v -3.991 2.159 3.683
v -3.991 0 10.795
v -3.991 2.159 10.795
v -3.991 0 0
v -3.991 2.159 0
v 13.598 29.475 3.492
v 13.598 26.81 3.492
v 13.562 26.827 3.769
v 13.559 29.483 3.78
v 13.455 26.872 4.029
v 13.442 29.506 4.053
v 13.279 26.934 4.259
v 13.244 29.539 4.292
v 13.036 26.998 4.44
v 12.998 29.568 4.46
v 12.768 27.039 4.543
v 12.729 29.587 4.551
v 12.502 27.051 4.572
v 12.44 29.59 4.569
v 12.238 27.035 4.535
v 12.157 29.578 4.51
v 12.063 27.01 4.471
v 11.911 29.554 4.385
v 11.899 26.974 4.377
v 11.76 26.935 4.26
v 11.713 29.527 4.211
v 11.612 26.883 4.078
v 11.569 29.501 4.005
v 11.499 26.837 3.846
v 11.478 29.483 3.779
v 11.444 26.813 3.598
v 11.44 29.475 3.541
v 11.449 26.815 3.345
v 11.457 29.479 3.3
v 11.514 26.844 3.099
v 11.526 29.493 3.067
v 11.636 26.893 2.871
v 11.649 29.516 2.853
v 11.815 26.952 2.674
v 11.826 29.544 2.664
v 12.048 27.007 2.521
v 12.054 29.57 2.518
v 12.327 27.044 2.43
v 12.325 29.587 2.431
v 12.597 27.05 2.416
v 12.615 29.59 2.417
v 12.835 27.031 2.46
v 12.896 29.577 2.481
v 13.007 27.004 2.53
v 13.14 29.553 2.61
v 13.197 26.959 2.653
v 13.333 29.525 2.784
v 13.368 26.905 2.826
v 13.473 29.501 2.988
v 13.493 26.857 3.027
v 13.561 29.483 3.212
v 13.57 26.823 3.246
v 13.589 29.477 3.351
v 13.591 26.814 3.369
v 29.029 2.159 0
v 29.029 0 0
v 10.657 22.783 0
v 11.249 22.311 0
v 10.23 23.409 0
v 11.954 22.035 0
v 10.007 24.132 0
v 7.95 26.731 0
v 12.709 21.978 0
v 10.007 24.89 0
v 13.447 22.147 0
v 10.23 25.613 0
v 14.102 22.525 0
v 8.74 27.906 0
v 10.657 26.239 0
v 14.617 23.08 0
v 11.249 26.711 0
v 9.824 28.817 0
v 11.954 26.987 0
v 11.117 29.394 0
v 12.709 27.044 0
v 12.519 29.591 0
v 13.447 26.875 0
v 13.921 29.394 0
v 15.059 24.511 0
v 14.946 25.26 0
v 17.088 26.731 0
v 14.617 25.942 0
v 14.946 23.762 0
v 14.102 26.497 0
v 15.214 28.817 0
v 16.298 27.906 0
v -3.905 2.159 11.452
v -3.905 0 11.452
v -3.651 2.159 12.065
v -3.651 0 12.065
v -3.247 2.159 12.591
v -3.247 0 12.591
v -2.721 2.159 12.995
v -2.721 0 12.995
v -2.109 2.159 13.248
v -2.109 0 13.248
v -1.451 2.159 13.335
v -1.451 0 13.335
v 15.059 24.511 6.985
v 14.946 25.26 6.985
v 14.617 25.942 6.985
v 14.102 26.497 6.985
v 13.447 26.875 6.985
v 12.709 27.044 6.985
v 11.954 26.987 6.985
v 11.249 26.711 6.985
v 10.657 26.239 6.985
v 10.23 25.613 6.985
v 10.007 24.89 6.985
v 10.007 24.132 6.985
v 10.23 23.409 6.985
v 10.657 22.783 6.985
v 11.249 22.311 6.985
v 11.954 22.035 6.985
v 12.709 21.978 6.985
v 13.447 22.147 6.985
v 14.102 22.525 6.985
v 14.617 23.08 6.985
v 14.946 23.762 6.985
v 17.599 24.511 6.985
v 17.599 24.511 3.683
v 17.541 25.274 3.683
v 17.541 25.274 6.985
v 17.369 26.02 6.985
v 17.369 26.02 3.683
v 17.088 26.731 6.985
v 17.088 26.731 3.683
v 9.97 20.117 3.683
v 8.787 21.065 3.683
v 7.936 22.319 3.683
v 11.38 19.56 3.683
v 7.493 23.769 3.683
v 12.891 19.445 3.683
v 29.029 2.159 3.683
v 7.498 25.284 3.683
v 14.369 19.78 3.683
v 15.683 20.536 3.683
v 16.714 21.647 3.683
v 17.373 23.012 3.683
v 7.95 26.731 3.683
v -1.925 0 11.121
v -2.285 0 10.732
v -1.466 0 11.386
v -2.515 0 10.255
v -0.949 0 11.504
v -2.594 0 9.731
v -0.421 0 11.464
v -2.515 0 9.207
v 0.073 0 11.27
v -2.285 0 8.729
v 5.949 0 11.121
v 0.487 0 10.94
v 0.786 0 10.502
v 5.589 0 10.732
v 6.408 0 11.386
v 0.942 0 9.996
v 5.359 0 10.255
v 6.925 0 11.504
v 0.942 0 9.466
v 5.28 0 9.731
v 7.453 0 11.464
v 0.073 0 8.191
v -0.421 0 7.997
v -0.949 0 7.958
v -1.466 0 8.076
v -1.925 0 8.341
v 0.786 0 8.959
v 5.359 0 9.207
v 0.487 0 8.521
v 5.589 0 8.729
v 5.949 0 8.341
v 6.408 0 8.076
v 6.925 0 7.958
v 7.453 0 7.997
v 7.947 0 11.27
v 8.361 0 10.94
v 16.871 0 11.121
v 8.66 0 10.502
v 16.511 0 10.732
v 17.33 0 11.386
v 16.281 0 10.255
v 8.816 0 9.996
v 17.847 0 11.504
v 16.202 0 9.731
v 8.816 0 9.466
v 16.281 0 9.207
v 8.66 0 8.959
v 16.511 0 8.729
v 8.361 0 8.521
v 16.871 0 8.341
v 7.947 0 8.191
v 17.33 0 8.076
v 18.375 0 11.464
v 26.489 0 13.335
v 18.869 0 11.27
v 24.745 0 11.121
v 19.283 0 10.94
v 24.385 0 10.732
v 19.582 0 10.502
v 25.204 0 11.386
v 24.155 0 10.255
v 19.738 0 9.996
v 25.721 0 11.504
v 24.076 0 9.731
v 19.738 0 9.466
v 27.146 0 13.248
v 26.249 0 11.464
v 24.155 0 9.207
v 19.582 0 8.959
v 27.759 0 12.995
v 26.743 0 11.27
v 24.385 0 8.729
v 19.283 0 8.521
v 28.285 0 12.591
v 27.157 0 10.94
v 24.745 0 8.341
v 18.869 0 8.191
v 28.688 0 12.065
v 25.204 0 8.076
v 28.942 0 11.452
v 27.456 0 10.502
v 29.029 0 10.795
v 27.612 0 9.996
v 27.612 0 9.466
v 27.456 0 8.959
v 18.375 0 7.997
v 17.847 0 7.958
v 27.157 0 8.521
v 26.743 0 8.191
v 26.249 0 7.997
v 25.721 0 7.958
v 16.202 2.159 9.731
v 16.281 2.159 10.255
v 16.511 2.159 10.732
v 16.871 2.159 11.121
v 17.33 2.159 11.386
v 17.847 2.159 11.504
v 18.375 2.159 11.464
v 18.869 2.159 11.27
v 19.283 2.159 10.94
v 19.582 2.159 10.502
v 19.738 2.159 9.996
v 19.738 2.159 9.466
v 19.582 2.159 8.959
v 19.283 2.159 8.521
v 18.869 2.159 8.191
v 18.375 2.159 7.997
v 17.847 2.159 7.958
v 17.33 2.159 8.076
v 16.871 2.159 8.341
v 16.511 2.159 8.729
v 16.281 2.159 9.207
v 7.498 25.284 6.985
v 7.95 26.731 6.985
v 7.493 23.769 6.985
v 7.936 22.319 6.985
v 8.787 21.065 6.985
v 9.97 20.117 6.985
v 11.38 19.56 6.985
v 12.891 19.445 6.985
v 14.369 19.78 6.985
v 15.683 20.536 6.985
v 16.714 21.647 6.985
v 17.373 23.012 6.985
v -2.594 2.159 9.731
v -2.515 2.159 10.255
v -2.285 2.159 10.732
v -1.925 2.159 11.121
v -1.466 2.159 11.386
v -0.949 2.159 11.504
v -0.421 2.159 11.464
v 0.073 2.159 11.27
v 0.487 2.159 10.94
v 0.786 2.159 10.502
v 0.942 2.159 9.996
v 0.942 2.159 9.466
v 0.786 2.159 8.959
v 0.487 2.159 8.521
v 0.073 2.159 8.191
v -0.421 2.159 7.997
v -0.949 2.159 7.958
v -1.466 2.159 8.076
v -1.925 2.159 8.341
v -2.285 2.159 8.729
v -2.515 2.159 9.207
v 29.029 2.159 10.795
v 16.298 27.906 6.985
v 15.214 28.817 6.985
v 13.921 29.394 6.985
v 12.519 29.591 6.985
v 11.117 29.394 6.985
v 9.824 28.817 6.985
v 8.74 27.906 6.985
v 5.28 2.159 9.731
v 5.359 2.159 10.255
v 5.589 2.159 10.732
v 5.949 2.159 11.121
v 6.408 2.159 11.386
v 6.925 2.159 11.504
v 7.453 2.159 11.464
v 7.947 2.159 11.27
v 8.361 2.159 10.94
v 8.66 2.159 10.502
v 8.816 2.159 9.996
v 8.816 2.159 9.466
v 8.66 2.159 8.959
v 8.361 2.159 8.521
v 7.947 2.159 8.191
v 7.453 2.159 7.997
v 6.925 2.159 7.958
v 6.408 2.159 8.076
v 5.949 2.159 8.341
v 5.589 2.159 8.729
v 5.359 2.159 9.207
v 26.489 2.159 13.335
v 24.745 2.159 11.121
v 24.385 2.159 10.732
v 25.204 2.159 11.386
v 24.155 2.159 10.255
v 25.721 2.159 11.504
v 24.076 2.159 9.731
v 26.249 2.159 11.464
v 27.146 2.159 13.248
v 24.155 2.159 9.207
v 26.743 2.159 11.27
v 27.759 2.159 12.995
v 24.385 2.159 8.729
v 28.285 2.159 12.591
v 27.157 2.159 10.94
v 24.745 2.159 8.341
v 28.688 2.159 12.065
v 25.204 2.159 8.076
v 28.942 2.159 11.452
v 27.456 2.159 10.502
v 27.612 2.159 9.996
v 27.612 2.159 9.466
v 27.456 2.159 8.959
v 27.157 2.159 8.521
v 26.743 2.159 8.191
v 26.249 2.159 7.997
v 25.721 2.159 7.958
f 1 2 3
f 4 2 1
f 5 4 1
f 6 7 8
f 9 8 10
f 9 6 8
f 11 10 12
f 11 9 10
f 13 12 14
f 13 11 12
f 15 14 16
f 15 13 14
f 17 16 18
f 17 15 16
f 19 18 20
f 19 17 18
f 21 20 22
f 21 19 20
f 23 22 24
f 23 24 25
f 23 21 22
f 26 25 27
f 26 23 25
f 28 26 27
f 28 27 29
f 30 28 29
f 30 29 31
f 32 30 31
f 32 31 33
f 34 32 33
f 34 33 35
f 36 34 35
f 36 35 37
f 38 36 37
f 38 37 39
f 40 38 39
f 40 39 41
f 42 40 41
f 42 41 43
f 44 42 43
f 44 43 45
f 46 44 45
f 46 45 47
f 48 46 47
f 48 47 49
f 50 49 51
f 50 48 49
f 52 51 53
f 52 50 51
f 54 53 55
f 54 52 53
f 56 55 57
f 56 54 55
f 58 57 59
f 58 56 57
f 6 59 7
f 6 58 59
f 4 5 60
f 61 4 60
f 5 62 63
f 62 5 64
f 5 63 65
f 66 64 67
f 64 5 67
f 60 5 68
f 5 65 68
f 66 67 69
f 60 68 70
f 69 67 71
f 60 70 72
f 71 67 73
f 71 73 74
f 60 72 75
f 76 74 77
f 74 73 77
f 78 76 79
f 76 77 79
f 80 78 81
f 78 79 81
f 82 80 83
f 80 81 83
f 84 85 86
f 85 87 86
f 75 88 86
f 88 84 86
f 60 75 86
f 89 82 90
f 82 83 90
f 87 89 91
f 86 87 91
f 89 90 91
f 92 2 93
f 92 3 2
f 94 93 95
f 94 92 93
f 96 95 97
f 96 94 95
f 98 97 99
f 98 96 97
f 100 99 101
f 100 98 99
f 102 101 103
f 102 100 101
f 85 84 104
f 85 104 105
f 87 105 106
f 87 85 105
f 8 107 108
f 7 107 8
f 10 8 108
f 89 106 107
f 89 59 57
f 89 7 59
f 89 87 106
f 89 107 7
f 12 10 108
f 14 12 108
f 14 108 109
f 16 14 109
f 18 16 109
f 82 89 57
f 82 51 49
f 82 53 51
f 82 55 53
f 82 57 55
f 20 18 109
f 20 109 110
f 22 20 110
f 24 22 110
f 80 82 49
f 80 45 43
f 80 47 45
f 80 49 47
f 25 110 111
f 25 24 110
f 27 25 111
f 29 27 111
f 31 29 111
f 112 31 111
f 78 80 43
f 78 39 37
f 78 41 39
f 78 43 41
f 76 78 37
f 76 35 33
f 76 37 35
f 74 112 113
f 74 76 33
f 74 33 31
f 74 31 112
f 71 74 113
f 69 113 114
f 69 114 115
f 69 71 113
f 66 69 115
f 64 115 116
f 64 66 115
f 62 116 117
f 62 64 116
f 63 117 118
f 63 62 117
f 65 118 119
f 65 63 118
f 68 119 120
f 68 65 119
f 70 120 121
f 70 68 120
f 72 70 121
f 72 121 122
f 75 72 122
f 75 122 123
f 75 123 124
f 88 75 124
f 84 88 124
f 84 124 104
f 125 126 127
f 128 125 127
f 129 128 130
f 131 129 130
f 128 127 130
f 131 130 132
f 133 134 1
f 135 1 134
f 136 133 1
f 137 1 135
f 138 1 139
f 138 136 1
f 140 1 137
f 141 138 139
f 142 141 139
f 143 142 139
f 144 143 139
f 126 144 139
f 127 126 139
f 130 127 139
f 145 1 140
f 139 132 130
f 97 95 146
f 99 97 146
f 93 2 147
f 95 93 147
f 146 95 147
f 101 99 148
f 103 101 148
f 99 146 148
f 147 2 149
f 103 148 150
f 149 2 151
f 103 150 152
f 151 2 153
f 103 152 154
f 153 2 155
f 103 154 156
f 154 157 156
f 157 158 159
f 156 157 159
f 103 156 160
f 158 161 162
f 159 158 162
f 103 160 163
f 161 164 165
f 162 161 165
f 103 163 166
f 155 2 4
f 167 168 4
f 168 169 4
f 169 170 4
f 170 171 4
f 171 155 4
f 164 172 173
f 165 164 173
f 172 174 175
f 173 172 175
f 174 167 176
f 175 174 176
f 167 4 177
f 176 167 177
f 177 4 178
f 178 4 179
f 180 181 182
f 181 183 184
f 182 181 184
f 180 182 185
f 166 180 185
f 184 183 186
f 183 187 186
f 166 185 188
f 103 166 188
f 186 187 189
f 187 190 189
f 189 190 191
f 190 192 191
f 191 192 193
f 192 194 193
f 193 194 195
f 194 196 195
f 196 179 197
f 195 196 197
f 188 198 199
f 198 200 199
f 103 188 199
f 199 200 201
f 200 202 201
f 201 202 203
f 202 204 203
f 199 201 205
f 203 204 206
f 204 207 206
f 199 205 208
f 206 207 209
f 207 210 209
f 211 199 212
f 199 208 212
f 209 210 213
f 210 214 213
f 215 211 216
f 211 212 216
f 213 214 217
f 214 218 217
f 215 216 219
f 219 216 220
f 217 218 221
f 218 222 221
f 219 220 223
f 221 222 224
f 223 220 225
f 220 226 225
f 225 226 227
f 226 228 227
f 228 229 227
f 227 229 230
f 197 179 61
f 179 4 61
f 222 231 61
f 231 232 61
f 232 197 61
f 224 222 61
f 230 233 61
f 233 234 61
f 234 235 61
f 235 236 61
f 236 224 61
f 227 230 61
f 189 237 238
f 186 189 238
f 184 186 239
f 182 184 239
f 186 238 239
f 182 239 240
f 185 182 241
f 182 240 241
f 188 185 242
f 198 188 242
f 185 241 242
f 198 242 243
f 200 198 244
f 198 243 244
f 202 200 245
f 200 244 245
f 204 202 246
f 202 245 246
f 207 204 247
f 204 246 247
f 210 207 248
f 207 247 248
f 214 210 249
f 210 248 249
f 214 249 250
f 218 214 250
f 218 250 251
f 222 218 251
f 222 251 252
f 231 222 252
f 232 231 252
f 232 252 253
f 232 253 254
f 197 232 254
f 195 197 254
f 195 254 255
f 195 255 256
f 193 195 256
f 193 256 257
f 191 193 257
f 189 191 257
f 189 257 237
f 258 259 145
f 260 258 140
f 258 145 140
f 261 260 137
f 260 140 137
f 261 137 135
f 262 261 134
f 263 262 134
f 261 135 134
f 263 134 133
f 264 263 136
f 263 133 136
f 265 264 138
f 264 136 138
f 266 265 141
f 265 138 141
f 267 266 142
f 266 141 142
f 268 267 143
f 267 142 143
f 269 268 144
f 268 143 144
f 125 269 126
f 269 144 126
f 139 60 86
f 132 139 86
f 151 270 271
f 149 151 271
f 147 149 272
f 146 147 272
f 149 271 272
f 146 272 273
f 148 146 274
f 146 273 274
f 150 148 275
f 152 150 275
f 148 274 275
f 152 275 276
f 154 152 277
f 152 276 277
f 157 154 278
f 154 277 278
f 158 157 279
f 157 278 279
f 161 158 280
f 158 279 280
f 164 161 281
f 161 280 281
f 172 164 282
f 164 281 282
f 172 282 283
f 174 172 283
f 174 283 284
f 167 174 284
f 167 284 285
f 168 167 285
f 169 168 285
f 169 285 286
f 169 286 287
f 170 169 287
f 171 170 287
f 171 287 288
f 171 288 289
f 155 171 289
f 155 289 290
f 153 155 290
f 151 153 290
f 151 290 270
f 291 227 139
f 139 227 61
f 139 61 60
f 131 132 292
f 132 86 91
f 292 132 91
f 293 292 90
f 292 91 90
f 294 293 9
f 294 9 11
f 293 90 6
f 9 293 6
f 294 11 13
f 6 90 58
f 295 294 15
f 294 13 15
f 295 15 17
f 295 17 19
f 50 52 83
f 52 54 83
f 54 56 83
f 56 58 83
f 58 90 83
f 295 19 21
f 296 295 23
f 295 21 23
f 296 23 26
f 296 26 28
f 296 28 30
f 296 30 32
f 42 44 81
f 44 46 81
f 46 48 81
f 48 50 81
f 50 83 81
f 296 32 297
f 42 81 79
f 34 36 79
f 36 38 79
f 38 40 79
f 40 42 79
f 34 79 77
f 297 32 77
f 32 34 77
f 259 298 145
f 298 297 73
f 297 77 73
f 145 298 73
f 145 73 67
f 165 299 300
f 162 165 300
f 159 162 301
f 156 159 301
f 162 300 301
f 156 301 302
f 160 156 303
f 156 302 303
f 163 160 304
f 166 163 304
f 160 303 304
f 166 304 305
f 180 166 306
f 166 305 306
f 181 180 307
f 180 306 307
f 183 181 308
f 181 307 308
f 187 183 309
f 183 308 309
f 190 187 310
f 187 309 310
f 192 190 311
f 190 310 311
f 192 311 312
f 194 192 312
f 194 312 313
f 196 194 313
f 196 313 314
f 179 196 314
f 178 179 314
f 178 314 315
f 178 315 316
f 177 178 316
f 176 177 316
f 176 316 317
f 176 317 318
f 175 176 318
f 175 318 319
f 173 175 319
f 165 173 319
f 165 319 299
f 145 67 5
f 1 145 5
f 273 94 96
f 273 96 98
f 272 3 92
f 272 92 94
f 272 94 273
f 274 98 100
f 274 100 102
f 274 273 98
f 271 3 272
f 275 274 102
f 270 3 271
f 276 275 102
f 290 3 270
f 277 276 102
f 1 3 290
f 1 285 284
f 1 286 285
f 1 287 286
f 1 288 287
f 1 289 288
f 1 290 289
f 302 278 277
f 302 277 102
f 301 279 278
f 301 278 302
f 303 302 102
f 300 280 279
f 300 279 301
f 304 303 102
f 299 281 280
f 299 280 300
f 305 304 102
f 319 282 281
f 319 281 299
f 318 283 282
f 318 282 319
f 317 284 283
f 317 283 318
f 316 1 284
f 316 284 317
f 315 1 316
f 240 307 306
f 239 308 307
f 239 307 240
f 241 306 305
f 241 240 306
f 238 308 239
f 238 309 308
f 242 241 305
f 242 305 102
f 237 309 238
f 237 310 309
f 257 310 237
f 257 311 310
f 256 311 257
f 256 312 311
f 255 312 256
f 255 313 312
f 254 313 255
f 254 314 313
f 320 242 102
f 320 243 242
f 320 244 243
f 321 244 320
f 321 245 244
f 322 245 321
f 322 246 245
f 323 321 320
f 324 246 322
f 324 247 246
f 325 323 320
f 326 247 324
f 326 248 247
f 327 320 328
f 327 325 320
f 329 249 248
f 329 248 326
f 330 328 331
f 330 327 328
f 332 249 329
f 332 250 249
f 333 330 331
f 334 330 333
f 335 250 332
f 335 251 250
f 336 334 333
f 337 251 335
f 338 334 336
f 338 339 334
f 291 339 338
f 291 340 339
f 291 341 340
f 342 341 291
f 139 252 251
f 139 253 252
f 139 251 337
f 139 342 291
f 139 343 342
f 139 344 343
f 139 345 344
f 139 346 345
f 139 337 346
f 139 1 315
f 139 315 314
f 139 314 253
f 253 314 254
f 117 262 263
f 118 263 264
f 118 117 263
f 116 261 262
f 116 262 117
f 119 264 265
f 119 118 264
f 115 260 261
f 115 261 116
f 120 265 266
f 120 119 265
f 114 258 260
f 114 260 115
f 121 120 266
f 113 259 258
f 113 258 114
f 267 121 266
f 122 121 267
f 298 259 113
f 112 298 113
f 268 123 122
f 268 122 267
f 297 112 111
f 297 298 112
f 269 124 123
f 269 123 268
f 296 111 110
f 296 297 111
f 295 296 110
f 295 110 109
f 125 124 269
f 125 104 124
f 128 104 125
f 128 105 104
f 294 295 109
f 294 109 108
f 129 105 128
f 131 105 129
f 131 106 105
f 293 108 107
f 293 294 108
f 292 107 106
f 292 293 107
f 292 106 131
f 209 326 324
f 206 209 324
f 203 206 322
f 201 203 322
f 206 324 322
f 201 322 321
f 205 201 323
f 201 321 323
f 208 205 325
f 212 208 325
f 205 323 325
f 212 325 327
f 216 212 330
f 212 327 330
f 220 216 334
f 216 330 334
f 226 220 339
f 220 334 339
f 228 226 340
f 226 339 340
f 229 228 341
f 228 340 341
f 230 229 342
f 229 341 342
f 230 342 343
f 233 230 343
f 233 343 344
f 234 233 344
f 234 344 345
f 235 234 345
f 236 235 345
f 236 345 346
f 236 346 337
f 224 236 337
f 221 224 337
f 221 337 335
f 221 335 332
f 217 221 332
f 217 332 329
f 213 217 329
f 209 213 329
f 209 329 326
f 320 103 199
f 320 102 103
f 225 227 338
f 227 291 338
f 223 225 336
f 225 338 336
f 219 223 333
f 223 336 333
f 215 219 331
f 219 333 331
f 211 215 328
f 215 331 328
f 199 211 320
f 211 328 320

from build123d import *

# Parameters (mm, degrees)
F0_W     = 33.02
F0_H     = 2.159
F0_R     = 2.54
F1_DEPTH = 3.683
F2_DEPTH = 13.335
F3_DEPTH = 6.985
F4_R     = 1.778
F5_DEPTH = 25.4
F6_R     = 2.54
F8_R     = 1.0795
F9_DEPTH = 3.81


with BuildPart() as f1:
    # F0 (on Top) → F1 (new body)
    with BuildSketch(Plane.XY):
        with Locations((12.518704, 1.0795)):
            Rectangle(F0_W, F0_H)
        with BuildLine():
            Line((7.949625, 26.731342), (-3.991296, 2.159))
            Line((-3.991296, 2.159), (29.028704, 2.159))
            Line((29.028704, 2.159), (17.087783, 26.731342))
            ThreePointArc((17.087783, 26.731342), (17.469326, 25.650184), (17.598704, 24.511))
            ThreePointArc((17.598704, 24.511), (11.37952, 19.560378), (7.949625, 26.731342))
        make_face()
        with BuildLine():
            ThreePointArc((17.087783, 26.731342), (12.518704, 29.591), (7.949625, 26.731342))
            ThreePointArc((7.949625, 26.731342), (11.37952, 19.560378), (17.598704, 24.511))
            ThreePointArc((17.598704, 24.511), (17.469326, 25.650184), (17.087783, 26.731342))
        make_face()
        with Locations((12.518704, 24.511)):
            Circle(F0_R, mode=Mode.SUBTRACT)
    extrude(amount=F1_DEPTH)

    # F0 (on Top) → F2 (join)
    with BuildSketch(Plane.XY):
        with Locations((12.518704, 1.0795)):
            Rectangle(F0_W, F0_H)
    extrude(amount=F2_DEPTH)

    # F0 (on Top) → F3 (join)
    with BuildSketch(Plane.XY):
        with BuildLine():
            ThreePointArc((17.087783, 26.731342), (12.518704, 29.591), (7.949625, 26.731342))
            ThreePointArc((7.949625, 26.731342), (11.37952, 19.560378), (17.598704, 24.511))
            ThreePointArc((17.598704, 24.511), (17.469326, 25.650184), (17.087783, 26.731342))
        make_face()
        with Locations((12.518704, 24.511)):
            Circle(F0_R, mode=Mode.SUBTRACT)
    extrude(amount=F3_DEPTH)

    # F4 (on face) → F5 (cut)
    with BuildSketch(Plane(origin=(0, 2.159, 0), x_dir=(-1, 0, 0), z_dir=(0, 1, 0))):
        with Locations((0.816296, 9.730688)):
            Circle(F4_R)
        with Locations((-25.853704, 9.730688)):
            Circle(F4_R)
        with Locations((-17.979704, 9.730688)):
            Circle(F4_R)
        with Locations((-7.057704, 9.730688)):
            Circle(F4_R)
    extrude(amount=-F5_DEPTH, mode=Mode.SUBTRACT)

    # F6
    f6_edges = [f1.edges().sort_by_distance(p)[0] for p in [
        (-3.991296, 1.0795, 13.335),
        (29.028704, 1.0795, 13.335),
    ]]
    fillet(f6_edges, radius=F6_R)

    # F8 (on offset) → F9 (cut)
    with BuildSketch(Plane.XZ.offset(-29.591)):
        with Locations((12.518704, 3.4925)):
            Circle(F8_R)
    extrude(amount=F9_DEPTH, mode=Mode.SUBTRACT)


solid = f1.part
